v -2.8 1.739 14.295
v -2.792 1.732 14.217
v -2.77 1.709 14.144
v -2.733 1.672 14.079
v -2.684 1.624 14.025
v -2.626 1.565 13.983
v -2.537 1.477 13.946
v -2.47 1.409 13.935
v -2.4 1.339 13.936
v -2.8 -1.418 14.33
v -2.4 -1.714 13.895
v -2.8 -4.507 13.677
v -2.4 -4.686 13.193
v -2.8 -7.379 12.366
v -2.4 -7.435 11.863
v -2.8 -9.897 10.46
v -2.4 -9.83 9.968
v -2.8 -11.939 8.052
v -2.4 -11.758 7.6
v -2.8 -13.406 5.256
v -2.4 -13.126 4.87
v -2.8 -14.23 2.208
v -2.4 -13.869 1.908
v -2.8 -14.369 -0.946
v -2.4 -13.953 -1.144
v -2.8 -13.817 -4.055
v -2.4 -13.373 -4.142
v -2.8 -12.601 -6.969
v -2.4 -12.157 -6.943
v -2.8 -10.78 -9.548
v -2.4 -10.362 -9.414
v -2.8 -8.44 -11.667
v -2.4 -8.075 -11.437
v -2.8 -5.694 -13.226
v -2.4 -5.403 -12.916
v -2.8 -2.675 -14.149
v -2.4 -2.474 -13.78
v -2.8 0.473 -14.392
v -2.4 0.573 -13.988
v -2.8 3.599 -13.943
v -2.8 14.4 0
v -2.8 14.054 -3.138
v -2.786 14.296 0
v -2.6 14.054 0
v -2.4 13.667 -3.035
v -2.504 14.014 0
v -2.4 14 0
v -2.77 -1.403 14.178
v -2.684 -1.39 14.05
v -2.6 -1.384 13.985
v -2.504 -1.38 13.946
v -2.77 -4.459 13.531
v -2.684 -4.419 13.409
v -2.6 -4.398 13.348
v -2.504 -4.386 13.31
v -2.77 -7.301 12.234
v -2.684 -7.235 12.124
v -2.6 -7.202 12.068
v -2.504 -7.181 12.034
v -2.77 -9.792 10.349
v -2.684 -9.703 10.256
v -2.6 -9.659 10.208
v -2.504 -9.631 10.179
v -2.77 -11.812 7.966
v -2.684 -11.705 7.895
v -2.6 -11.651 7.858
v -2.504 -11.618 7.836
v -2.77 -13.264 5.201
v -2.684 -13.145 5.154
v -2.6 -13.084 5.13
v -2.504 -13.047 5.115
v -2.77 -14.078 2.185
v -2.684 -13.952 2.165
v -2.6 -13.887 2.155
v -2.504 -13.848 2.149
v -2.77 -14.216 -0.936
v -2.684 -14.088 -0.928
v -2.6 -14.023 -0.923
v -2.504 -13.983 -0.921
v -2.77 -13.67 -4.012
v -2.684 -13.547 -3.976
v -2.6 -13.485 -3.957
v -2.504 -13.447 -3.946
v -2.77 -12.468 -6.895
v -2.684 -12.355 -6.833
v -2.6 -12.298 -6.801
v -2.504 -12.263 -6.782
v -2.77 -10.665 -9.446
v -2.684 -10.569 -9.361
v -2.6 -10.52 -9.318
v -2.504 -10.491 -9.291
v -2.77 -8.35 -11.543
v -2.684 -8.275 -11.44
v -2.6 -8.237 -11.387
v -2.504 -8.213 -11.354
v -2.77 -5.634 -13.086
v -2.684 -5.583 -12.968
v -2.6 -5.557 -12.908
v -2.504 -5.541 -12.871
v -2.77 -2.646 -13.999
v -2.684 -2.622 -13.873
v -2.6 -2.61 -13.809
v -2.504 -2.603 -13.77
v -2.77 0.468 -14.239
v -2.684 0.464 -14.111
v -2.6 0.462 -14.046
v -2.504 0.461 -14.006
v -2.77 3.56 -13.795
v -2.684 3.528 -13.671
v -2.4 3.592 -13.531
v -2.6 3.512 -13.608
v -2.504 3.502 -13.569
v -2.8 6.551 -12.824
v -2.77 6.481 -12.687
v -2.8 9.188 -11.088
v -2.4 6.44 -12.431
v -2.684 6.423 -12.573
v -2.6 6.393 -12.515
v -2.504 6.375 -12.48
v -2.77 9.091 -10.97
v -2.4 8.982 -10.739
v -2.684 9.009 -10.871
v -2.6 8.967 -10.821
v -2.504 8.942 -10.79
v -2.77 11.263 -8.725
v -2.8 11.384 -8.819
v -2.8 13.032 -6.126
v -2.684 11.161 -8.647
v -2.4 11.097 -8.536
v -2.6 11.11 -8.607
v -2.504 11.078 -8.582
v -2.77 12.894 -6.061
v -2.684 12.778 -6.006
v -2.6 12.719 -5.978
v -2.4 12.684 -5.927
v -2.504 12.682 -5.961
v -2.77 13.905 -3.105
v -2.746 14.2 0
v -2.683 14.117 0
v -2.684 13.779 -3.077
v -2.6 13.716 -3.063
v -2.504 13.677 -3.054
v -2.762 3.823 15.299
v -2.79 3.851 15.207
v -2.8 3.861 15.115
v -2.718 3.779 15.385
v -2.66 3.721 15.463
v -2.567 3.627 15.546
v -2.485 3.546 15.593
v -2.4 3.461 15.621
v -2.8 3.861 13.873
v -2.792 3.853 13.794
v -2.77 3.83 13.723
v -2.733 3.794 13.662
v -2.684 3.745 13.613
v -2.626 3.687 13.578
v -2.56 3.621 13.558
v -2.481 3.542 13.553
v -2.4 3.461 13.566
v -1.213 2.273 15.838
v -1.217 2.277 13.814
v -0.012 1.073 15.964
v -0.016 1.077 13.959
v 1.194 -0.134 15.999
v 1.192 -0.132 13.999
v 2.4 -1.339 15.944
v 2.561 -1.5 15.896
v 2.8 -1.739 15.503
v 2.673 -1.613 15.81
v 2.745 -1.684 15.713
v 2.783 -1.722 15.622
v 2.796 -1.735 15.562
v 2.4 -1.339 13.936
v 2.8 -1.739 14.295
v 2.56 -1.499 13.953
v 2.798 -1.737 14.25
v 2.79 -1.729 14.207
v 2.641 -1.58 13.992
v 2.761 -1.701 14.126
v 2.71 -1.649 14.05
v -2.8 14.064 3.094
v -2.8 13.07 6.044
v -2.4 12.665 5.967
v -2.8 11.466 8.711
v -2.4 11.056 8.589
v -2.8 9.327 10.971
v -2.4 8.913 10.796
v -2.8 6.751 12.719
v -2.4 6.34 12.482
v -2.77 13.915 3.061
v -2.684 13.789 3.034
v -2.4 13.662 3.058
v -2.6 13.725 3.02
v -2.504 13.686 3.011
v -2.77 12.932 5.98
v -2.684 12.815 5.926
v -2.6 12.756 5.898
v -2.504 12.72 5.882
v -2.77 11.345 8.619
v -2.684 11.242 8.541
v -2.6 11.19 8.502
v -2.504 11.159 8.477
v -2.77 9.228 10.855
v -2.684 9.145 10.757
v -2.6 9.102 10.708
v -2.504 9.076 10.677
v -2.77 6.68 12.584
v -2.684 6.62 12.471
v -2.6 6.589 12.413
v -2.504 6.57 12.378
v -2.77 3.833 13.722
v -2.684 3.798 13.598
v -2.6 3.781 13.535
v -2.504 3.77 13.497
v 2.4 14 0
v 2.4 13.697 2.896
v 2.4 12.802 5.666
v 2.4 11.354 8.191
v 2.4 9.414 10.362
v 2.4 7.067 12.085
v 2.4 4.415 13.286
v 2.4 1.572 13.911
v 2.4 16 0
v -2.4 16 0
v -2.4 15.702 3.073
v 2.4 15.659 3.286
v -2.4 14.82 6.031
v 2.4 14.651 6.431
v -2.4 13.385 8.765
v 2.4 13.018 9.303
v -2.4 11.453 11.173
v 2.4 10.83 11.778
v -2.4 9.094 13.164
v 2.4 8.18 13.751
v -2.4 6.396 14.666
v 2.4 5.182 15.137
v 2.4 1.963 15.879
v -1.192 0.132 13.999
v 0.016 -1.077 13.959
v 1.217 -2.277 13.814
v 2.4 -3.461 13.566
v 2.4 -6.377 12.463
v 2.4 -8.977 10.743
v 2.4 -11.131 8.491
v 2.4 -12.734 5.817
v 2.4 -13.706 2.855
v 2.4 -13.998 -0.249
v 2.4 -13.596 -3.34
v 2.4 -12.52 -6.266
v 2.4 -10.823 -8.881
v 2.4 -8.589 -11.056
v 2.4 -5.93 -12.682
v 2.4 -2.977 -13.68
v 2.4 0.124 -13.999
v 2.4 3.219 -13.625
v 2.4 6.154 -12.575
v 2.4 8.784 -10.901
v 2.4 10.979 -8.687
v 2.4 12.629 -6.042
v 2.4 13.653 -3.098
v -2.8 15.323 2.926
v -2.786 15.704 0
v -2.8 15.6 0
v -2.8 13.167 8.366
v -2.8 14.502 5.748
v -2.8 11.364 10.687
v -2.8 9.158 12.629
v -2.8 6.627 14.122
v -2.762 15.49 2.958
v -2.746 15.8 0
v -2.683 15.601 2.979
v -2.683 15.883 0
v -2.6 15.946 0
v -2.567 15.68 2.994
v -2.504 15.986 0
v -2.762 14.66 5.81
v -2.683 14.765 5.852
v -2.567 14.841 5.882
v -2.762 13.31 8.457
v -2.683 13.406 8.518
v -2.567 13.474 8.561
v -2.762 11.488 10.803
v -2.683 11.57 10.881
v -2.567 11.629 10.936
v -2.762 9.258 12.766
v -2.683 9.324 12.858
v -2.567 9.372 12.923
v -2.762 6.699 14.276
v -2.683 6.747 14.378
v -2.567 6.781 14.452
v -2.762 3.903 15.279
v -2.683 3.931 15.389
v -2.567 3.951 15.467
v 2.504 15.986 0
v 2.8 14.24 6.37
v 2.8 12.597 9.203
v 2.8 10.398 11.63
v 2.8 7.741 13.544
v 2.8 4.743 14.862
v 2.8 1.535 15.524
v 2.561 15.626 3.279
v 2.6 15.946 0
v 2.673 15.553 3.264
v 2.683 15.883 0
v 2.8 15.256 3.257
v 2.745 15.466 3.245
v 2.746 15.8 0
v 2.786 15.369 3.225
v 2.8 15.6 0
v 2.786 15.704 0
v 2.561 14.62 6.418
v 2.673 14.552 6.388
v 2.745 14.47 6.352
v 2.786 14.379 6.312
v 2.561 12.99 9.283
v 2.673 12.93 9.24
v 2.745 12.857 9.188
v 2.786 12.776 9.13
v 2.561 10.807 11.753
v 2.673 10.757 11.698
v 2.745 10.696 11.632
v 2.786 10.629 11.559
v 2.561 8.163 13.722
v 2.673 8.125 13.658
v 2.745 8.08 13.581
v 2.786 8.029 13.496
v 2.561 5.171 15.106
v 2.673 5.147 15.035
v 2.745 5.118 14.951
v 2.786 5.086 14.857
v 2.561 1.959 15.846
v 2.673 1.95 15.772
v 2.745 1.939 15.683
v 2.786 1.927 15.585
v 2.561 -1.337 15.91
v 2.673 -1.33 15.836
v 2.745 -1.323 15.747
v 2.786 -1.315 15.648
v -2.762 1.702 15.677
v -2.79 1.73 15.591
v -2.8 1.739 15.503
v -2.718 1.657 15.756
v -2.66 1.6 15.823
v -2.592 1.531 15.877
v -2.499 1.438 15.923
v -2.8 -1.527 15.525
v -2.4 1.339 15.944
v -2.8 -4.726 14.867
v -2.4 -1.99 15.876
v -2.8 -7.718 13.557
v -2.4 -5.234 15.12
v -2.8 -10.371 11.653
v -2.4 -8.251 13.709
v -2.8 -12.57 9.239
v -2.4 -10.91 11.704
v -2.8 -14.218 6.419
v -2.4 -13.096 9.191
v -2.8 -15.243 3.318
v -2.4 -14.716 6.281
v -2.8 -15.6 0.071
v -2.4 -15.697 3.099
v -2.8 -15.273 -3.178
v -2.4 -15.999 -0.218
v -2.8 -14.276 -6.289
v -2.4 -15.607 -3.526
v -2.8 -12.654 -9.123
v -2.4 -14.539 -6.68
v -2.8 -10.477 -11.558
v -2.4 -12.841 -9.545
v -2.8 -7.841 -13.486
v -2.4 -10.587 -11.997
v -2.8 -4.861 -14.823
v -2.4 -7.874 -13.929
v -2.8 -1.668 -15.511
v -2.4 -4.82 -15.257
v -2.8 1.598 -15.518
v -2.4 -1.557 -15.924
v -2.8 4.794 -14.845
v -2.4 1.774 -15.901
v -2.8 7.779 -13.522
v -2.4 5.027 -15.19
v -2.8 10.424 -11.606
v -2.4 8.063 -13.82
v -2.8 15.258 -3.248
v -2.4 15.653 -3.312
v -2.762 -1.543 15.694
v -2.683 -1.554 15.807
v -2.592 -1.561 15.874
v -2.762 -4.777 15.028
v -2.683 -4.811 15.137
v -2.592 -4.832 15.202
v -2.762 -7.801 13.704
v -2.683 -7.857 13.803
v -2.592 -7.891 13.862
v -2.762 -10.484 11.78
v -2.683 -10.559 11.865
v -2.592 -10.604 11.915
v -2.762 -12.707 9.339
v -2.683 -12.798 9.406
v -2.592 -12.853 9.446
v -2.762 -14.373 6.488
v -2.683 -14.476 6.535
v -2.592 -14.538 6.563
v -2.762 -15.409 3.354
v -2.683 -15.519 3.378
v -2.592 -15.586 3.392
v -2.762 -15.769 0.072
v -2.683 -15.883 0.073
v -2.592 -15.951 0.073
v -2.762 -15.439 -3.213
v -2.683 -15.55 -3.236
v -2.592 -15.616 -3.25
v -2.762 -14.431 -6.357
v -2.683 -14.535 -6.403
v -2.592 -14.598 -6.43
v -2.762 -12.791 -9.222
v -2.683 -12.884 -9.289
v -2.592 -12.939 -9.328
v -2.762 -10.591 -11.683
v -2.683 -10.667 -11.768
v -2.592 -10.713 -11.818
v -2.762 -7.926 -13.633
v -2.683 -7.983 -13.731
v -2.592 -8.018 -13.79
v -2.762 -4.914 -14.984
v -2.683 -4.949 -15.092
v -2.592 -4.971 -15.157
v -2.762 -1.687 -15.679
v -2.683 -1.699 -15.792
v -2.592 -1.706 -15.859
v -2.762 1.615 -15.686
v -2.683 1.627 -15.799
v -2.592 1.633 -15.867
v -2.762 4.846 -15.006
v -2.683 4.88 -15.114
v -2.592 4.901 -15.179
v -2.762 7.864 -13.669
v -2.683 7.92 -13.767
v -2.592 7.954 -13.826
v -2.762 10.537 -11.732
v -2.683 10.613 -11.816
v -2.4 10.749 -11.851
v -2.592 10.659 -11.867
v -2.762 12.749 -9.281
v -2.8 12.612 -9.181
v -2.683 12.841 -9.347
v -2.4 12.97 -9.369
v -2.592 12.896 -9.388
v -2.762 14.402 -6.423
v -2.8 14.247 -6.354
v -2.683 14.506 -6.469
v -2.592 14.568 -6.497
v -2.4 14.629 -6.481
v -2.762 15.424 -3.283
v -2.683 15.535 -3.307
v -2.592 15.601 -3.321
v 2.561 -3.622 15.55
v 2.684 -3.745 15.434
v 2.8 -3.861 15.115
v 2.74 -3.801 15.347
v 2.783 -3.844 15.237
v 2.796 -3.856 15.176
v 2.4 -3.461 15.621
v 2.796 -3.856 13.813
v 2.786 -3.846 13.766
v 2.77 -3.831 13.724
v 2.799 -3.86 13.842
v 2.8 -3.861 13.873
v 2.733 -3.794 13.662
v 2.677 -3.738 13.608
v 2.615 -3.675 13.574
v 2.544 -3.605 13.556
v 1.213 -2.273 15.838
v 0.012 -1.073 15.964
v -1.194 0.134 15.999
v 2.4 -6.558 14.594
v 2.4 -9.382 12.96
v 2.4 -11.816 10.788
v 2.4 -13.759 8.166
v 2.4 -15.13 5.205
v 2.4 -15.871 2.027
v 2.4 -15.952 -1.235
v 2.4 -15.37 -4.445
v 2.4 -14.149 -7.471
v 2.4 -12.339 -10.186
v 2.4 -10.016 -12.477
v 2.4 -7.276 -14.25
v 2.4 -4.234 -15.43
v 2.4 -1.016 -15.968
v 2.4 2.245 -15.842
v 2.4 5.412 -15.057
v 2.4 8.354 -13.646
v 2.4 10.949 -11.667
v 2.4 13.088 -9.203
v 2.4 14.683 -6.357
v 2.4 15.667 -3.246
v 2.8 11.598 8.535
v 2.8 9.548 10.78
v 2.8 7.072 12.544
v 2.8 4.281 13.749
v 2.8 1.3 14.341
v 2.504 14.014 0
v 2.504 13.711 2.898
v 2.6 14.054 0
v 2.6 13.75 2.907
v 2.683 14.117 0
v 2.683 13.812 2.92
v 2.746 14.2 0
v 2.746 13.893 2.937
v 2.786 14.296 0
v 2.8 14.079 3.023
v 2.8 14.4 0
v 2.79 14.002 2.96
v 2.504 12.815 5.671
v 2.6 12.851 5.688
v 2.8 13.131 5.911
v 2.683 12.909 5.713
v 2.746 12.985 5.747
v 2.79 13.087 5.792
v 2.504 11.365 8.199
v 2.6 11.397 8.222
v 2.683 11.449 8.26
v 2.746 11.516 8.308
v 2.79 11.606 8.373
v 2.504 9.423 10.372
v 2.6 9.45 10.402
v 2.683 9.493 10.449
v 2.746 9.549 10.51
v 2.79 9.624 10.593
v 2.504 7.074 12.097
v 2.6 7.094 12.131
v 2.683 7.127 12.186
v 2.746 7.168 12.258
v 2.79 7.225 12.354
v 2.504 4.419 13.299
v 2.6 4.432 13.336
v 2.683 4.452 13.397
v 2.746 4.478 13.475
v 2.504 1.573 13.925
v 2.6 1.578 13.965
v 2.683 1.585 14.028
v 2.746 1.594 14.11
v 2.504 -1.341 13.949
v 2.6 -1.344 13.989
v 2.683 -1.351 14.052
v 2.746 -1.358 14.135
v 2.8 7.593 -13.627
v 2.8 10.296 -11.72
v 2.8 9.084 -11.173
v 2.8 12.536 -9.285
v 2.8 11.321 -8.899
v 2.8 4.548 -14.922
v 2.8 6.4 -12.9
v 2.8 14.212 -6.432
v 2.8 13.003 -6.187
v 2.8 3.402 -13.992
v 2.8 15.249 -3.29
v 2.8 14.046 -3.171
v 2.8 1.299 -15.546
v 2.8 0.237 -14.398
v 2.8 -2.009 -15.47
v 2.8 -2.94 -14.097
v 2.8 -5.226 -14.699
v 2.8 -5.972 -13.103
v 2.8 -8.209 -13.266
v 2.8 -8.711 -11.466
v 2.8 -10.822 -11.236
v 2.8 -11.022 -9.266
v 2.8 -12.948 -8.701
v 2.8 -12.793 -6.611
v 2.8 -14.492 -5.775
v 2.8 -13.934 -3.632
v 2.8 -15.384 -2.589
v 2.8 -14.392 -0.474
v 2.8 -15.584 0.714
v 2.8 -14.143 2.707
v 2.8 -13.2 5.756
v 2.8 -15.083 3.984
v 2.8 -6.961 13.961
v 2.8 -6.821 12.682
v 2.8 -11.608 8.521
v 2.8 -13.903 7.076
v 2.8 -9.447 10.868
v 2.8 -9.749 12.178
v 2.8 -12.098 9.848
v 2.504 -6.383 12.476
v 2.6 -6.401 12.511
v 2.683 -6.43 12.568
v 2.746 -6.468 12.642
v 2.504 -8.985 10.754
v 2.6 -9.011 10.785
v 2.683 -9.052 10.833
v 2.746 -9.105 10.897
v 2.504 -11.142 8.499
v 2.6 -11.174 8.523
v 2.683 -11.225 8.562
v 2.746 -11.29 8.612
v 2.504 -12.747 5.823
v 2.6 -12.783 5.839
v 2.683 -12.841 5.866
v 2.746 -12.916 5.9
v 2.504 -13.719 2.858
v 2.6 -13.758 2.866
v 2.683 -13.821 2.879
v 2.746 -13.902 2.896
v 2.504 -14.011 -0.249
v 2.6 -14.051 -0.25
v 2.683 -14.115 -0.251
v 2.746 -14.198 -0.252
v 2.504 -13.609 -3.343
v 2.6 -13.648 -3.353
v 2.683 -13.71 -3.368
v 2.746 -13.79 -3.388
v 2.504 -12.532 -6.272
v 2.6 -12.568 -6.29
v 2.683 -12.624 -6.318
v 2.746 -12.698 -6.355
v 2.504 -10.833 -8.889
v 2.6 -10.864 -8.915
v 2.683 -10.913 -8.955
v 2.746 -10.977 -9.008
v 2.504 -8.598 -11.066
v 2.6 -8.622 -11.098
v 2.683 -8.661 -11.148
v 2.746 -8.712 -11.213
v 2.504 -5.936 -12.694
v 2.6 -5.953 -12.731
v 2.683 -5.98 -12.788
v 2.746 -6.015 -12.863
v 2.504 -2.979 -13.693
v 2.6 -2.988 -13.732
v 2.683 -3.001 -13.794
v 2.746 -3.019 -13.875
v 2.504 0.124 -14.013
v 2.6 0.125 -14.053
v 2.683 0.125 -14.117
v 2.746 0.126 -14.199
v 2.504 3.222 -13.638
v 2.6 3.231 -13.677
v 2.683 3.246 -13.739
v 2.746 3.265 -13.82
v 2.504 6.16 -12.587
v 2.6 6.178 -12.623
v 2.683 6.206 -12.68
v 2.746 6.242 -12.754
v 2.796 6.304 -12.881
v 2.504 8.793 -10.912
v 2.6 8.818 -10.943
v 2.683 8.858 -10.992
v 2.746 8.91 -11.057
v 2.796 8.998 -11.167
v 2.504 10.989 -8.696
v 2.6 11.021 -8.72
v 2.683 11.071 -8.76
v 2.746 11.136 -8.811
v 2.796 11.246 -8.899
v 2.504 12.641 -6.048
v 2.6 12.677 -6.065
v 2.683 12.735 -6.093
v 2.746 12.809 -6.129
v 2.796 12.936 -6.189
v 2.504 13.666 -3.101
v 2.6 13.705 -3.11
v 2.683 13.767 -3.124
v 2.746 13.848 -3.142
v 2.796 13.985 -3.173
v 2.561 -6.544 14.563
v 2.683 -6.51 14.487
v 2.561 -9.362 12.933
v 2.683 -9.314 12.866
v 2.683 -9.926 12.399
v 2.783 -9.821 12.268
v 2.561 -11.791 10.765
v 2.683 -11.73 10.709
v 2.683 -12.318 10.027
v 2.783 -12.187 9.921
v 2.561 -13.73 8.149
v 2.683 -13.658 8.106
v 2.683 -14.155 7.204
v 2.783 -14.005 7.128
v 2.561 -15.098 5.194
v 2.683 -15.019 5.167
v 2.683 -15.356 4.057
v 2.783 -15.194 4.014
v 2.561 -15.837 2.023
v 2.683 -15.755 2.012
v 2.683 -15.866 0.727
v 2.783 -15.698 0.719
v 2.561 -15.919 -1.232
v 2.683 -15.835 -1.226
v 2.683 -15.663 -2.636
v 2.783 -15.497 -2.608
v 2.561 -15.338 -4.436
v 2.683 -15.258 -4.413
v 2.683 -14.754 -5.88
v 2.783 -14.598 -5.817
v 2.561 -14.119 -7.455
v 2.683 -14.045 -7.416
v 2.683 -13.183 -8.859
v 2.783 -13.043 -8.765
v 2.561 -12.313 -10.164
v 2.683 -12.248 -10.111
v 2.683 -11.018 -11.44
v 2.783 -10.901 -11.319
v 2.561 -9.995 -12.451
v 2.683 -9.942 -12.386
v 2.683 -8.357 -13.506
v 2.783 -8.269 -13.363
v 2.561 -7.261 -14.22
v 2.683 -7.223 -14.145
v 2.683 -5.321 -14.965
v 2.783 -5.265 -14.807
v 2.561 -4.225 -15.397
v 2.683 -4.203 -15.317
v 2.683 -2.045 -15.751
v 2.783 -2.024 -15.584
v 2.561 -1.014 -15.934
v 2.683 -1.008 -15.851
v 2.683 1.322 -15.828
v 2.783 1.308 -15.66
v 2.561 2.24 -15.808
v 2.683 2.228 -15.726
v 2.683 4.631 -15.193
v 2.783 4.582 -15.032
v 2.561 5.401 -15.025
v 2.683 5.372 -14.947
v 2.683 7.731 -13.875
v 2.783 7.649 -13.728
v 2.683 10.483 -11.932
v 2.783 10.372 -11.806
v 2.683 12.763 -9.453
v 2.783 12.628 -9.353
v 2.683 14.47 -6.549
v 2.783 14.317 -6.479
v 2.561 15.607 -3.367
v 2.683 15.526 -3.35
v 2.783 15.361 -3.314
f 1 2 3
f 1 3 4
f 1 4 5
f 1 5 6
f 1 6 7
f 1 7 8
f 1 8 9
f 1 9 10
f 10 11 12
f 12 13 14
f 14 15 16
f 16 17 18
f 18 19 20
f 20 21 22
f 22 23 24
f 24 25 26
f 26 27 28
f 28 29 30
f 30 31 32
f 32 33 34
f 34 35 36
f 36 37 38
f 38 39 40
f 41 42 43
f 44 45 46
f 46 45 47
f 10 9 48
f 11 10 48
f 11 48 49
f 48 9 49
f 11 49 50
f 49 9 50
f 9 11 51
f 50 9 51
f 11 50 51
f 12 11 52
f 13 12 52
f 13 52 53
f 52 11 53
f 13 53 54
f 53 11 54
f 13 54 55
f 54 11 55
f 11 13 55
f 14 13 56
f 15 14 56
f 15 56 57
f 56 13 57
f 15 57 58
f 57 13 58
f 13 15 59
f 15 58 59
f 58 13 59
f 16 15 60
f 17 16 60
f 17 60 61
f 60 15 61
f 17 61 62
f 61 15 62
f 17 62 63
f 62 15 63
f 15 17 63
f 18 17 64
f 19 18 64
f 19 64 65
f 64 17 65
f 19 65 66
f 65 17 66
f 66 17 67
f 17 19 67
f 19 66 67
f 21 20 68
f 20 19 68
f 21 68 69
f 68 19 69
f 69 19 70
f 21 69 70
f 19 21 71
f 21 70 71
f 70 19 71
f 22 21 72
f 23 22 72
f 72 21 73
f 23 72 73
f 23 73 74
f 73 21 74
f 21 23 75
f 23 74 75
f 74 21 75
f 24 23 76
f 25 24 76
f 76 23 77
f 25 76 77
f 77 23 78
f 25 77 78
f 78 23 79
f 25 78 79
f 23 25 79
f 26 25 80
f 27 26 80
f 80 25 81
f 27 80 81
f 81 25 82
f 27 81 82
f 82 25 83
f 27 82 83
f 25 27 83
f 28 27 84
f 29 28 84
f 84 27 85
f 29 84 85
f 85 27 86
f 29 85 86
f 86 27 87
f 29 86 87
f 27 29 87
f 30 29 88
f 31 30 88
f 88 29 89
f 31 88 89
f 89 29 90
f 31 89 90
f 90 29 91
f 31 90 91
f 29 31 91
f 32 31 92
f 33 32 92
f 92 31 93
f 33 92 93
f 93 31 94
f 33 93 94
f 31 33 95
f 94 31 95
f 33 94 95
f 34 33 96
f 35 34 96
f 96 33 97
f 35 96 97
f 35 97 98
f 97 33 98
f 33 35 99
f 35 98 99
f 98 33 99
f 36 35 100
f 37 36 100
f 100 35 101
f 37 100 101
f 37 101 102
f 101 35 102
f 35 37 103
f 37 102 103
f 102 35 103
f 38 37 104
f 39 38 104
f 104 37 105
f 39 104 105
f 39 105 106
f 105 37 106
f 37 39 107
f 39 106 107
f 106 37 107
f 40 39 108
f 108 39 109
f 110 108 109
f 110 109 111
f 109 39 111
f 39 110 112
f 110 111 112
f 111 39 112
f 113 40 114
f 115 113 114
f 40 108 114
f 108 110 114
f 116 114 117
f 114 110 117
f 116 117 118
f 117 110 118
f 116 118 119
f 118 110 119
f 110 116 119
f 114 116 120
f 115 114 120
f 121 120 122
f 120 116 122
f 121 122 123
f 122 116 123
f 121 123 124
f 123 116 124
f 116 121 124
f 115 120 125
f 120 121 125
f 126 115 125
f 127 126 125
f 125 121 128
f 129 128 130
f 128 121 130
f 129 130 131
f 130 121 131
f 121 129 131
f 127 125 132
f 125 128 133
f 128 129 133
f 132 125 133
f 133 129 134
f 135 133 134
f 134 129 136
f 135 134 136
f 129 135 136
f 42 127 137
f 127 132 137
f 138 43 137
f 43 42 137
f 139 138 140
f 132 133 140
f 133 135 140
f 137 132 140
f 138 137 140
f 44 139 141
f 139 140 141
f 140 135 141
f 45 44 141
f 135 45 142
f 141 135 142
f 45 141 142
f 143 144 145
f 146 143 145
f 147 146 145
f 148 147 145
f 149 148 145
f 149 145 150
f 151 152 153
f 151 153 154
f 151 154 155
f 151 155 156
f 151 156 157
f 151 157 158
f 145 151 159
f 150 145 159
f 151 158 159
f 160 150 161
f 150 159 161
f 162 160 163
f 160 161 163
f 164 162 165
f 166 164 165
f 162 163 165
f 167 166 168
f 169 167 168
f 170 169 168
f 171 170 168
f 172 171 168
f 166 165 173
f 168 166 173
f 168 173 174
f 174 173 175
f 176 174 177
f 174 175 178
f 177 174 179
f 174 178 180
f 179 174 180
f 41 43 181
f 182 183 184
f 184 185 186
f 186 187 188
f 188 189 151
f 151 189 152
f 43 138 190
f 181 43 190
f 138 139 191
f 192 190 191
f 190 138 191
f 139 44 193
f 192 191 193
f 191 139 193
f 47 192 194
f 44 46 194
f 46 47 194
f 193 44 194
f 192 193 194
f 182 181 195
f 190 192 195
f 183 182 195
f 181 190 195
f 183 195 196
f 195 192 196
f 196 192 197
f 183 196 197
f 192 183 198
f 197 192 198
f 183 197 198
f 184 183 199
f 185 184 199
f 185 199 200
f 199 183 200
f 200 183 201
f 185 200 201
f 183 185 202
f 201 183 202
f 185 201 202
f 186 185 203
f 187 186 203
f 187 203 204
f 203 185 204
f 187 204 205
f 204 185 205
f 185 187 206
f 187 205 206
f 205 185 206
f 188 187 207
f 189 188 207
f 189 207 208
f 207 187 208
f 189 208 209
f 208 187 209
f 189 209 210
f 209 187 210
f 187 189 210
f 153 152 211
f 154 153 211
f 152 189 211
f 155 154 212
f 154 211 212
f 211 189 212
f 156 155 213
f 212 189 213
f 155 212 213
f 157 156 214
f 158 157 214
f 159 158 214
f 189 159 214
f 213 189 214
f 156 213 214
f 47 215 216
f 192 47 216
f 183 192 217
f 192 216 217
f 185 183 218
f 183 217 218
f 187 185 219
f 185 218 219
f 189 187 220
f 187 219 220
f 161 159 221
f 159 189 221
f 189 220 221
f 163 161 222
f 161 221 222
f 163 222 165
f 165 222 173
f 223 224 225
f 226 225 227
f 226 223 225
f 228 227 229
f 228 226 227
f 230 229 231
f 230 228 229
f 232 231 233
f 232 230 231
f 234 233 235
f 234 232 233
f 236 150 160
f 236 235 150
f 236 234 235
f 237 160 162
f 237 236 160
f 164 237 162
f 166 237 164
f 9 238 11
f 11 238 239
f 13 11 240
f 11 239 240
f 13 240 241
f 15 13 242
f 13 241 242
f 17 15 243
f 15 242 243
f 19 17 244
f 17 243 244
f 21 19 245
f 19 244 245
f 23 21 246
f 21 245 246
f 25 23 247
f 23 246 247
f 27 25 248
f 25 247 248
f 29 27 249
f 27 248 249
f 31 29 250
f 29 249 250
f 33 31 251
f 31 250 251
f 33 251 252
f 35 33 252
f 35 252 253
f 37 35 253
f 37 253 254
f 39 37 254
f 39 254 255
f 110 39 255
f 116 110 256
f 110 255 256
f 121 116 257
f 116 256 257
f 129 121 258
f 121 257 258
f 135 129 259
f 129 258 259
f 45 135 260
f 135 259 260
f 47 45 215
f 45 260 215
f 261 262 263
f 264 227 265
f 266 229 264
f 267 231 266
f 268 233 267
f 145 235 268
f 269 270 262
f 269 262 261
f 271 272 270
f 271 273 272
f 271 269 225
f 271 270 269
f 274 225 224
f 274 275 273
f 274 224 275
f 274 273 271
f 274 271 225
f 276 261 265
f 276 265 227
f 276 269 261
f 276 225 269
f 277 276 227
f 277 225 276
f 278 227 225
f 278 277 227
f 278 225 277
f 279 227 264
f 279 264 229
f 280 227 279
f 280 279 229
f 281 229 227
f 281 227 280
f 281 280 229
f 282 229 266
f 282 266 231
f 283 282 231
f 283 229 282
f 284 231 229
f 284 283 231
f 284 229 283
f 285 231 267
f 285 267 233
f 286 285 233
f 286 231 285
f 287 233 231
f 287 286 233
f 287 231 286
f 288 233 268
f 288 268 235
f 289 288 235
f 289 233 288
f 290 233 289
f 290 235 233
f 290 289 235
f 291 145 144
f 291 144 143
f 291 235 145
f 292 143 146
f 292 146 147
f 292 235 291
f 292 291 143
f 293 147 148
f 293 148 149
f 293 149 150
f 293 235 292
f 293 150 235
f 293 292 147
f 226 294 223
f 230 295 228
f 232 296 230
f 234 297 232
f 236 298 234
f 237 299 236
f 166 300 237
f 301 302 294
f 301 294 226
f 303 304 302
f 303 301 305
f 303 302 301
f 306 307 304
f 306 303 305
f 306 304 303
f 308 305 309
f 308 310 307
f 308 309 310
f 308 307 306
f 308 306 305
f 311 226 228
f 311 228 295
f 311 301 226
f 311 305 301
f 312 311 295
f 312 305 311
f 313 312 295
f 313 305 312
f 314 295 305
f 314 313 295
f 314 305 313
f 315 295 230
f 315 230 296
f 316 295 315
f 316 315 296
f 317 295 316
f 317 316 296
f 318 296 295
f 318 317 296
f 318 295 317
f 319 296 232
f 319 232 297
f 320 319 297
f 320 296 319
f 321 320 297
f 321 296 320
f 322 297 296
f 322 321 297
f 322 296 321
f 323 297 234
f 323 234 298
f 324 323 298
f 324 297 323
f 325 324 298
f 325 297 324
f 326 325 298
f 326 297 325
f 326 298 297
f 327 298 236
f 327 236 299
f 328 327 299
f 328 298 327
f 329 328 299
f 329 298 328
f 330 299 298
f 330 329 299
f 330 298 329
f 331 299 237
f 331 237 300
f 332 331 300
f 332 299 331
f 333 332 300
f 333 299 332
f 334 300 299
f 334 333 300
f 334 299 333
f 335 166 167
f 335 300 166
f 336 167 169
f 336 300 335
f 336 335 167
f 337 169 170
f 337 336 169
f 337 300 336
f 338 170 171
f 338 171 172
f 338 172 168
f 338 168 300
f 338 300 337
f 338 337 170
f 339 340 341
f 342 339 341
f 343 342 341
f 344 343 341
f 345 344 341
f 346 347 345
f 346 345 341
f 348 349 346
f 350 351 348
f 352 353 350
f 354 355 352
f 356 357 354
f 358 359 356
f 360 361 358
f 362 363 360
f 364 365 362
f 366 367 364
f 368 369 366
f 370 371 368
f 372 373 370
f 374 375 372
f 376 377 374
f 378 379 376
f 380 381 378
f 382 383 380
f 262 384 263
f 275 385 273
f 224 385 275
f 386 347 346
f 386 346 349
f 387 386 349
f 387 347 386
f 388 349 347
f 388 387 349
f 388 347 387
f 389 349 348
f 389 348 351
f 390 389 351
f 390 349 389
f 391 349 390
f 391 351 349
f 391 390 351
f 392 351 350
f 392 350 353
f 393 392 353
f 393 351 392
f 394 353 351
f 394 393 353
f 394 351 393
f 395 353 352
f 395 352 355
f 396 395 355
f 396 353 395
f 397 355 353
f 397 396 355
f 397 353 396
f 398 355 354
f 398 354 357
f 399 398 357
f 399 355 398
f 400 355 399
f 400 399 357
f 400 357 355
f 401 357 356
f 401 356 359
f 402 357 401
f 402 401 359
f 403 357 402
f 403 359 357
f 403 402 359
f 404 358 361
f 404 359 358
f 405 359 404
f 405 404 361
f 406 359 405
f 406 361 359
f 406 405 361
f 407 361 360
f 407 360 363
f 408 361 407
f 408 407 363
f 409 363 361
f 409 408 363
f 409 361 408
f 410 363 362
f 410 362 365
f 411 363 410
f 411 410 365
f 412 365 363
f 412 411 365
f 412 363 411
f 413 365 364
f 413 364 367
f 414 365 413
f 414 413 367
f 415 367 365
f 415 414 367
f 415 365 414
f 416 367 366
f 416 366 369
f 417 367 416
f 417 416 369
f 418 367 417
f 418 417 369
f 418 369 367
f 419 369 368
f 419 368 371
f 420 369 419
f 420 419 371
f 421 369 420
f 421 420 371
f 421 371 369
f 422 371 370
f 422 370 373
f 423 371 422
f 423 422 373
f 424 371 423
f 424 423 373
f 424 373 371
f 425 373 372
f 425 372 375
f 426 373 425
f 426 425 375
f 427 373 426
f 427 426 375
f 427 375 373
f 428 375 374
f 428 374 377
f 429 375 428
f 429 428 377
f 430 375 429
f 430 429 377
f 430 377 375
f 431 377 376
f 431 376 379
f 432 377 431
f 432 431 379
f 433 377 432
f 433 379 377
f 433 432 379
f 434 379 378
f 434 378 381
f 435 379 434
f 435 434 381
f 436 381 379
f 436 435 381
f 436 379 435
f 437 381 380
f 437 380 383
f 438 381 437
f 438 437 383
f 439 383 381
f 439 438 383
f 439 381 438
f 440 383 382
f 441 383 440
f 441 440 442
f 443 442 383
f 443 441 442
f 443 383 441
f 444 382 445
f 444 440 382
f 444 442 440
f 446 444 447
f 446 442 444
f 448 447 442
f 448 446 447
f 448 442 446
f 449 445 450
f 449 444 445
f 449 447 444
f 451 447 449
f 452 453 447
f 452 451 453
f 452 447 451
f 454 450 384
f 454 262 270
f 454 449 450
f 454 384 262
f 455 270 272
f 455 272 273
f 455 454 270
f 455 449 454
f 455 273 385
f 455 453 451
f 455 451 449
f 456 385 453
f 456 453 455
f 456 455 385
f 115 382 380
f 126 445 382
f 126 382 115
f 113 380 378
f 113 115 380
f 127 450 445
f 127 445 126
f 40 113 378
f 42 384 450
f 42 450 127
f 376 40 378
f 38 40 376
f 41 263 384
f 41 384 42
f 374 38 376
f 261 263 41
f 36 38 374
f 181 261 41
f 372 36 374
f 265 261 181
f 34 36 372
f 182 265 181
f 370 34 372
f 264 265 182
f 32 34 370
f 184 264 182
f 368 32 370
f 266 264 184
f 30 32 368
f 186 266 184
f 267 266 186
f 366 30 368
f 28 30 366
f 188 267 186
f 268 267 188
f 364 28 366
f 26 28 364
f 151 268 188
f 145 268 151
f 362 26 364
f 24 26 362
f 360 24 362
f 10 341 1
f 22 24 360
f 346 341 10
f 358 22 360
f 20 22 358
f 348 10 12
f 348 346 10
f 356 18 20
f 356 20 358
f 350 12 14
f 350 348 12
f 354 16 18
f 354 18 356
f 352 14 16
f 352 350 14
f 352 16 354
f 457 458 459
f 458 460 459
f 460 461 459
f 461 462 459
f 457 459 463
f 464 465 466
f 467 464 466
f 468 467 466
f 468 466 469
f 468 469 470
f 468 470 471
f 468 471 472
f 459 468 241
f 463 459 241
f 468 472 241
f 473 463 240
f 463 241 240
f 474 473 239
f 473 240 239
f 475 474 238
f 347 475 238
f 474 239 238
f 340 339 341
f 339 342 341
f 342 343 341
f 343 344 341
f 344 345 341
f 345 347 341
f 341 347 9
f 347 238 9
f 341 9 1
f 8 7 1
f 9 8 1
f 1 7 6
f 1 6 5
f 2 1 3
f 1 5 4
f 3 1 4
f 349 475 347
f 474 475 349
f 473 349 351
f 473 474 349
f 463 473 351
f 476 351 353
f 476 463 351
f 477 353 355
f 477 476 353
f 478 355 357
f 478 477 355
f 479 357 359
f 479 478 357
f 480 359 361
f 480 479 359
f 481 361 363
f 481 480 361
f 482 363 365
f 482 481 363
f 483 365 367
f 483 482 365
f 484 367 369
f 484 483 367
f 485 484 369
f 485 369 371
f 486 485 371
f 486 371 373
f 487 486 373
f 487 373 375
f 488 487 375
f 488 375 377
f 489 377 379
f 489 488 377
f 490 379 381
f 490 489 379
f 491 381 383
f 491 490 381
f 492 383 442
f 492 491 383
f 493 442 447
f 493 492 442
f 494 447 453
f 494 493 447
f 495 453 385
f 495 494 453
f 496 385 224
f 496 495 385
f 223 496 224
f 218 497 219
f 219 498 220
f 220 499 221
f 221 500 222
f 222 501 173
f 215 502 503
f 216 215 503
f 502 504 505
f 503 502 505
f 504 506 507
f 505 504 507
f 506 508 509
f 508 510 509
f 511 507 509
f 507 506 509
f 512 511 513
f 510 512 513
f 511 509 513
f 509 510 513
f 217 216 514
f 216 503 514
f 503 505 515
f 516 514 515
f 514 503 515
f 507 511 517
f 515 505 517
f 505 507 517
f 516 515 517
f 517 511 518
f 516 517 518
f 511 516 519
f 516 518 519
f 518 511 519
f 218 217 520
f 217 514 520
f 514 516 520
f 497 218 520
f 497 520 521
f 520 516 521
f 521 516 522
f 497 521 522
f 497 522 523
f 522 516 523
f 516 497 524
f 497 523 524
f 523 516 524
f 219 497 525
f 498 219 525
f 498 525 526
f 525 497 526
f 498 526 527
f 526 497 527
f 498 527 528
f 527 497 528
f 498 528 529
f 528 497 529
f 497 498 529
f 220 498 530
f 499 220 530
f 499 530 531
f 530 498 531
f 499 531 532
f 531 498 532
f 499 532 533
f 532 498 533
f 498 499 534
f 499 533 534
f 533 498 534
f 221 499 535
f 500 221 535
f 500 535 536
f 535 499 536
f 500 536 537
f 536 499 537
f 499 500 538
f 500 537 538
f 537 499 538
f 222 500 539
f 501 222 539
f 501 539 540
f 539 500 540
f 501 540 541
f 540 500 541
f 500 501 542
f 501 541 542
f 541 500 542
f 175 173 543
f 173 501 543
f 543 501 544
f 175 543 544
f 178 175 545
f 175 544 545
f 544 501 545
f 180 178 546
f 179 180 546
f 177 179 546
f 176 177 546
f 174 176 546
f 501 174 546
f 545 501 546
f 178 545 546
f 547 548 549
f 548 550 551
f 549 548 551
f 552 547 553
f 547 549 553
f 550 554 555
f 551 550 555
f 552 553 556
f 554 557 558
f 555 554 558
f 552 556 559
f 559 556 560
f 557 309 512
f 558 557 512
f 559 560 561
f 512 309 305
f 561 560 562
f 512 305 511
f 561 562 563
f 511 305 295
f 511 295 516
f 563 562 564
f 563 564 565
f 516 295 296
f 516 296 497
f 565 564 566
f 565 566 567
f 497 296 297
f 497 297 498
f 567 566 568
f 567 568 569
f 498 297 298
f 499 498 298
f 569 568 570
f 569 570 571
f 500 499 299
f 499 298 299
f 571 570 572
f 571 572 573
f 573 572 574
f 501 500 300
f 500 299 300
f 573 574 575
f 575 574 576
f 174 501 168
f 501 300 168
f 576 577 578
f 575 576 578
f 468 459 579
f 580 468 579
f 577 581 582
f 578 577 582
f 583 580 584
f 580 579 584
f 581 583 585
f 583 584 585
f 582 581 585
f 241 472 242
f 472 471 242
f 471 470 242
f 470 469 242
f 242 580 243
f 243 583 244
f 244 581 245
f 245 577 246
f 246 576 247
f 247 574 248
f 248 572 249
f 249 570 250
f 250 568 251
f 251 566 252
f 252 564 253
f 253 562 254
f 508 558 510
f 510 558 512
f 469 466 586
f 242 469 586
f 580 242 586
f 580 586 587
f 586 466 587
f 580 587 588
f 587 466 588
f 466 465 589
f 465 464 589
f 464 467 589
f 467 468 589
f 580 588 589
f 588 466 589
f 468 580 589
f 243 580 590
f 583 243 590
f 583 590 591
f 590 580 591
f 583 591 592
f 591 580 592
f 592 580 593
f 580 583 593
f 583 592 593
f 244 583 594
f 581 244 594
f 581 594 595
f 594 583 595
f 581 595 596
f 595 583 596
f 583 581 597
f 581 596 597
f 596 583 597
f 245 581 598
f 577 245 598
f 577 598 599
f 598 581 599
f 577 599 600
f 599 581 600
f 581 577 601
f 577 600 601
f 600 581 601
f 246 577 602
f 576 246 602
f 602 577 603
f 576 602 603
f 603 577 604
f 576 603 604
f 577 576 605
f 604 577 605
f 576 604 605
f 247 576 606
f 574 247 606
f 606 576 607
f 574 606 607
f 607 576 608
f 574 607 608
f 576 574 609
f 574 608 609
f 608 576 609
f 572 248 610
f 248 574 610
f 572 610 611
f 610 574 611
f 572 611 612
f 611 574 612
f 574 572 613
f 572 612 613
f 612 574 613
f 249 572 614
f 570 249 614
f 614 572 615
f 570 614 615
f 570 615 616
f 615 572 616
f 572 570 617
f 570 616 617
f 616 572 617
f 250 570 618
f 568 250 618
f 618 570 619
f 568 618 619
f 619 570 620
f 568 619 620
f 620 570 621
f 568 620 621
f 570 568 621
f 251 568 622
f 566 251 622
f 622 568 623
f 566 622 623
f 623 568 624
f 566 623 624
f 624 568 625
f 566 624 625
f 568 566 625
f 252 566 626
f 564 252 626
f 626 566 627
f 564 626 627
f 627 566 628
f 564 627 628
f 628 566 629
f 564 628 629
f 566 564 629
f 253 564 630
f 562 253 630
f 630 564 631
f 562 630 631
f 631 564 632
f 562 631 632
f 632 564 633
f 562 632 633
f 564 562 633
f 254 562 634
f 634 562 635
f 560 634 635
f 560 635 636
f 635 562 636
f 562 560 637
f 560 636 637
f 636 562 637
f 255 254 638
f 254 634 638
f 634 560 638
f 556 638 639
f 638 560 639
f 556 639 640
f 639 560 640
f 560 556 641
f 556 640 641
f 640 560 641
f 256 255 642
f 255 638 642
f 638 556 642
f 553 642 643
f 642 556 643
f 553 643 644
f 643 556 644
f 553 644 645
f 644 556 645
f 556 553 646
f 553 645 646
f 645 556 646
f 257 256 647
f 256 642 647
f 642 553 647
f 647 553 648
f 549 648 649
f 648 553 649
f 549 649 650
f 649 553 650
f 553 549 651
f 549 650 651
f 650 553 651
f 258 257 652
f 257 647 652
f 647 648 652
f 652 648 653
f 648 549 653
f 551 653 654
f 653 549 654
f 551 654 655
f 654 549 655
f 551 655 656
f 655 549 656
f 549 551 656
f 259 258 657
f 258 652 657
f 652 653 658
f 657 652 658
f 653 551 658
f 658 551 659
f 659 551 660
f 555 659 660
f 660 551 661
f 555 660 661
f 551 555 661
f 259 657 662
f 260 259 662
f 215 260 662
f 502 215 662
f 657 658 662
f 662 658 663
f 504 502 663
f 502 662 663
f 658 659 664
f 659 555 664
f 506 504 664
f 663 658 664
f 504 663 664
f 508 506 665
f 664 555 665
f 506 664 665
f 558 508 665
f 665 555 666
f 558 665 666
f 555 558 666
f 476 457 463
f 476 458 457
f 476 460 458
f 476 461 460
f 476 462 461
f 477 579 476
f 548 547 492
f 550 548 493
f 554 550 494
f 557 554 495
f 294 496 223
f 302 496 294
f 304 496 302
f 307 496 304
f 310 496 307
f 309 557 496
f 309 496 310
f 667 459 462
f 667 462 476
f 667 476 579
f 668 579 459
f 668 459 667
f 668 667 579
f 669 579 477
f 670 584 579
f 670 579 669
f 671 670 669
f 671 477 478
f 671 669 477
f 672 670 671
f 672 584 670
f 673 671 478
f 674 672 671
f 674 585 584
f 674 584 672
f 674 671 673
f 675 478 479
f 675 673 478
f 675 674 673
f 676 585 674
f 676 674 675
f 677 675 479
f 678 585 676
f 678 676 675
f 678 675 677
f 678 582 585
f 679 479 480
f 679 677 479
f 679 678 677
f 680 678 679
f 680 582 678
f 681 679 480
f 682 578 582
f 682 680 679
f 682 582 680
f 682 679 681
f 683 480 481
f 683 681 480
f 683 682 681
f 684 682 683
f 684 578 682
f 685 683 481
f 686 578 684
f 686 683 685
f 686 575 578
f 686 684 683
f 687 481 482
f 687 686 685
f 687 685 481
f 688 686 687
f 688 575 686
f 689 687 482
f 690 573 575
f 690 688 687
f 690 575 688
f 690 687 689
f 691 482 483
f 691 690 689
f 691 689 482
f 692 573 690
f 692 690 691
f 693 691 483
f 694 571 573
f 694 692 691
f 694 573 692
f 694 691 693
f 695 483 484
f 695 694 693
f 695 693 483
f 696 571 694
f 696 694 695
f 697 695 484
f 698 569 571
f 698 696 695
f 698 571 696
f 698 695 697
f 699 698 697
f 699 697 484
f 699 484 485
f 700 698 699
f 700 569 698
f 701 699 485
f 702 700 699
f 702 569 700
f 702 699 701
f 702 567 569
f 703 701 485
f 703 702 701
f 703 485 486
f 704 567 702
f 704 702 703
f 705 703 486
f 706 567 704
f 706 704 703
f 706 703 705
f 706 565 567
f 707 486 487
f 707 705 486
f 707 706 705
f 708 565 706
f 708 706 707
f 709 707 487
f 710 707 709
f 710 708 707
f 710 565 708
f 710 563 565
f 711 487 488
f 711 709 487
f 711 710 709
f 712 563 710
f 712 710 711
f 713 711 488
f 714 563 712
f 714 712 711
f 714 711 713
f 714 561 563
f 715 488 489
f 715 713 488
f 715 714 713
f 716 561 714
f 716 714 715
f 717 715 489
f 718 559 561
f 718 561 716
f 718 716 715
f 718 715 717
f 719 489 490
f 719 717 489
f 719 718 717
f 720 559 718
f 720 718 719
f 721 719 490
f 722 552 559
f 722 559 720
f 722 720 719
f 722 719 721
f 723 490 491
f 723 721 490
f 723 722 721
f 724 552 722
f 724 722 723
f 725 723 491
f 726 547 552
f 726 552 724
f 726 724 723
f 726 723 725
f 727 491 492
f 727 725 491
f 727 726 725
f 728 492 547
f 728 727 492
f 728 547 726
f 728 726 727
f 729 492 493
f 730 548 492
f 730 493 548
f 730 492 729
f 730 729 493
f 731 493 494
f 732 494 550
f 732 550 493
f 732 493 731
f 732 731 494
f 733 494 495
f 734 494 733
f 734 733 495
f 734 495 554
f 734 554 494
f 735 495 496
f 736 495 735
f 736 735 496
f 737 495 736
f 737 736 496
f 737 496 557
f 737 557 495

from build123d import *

# Parameters (mm, degrees)
SKETCH_1_W          = 5.6
SKETCH_1_H          = 2
CUT_EXTRUDE_1_DEPTH = 17
FILLET_1_R          = 0.4


with BuildPart() as part:
    # Эскиз1 → Повернуть1 (revolve)
    with BuildSketch(Plane.XY):
        with Locations((0, 15)):
            Rectangle(SKETCH_1_W, SKETCH_1_H)
    revolve(axis=Axis((0, 0, 0), (1, 0, 0)))

    # Эскиз2 → Вырез-Вытянуть1 (cut, through all)
    with BuildSketch(Plane.XY):
        Polygon((2.8, -3.860660172), (-3.860660172, 2.8), (-2.8, 3.860660172), (3.860660172, -2.8), align=None)
    extrude(amount=CUT_EXTRUDE_1_DEPTH, mode=Mode.SUBTRACT)

    # Скругление1
    fillet_1_edges = [part.edges().sort_by_distance(p)[0] for p in [
        (-2.8, -11.912796423, -10.681071172),
        (2.8, -9.854680037, -12.604970503),
        (-2.8, -10.496446008, -9.264157879),
        (2.8, -8.424688647, -11.181440927),
    ]]
    fillet(fillet_1_edges, radius=FILLET_1_R)


solid = part.part
